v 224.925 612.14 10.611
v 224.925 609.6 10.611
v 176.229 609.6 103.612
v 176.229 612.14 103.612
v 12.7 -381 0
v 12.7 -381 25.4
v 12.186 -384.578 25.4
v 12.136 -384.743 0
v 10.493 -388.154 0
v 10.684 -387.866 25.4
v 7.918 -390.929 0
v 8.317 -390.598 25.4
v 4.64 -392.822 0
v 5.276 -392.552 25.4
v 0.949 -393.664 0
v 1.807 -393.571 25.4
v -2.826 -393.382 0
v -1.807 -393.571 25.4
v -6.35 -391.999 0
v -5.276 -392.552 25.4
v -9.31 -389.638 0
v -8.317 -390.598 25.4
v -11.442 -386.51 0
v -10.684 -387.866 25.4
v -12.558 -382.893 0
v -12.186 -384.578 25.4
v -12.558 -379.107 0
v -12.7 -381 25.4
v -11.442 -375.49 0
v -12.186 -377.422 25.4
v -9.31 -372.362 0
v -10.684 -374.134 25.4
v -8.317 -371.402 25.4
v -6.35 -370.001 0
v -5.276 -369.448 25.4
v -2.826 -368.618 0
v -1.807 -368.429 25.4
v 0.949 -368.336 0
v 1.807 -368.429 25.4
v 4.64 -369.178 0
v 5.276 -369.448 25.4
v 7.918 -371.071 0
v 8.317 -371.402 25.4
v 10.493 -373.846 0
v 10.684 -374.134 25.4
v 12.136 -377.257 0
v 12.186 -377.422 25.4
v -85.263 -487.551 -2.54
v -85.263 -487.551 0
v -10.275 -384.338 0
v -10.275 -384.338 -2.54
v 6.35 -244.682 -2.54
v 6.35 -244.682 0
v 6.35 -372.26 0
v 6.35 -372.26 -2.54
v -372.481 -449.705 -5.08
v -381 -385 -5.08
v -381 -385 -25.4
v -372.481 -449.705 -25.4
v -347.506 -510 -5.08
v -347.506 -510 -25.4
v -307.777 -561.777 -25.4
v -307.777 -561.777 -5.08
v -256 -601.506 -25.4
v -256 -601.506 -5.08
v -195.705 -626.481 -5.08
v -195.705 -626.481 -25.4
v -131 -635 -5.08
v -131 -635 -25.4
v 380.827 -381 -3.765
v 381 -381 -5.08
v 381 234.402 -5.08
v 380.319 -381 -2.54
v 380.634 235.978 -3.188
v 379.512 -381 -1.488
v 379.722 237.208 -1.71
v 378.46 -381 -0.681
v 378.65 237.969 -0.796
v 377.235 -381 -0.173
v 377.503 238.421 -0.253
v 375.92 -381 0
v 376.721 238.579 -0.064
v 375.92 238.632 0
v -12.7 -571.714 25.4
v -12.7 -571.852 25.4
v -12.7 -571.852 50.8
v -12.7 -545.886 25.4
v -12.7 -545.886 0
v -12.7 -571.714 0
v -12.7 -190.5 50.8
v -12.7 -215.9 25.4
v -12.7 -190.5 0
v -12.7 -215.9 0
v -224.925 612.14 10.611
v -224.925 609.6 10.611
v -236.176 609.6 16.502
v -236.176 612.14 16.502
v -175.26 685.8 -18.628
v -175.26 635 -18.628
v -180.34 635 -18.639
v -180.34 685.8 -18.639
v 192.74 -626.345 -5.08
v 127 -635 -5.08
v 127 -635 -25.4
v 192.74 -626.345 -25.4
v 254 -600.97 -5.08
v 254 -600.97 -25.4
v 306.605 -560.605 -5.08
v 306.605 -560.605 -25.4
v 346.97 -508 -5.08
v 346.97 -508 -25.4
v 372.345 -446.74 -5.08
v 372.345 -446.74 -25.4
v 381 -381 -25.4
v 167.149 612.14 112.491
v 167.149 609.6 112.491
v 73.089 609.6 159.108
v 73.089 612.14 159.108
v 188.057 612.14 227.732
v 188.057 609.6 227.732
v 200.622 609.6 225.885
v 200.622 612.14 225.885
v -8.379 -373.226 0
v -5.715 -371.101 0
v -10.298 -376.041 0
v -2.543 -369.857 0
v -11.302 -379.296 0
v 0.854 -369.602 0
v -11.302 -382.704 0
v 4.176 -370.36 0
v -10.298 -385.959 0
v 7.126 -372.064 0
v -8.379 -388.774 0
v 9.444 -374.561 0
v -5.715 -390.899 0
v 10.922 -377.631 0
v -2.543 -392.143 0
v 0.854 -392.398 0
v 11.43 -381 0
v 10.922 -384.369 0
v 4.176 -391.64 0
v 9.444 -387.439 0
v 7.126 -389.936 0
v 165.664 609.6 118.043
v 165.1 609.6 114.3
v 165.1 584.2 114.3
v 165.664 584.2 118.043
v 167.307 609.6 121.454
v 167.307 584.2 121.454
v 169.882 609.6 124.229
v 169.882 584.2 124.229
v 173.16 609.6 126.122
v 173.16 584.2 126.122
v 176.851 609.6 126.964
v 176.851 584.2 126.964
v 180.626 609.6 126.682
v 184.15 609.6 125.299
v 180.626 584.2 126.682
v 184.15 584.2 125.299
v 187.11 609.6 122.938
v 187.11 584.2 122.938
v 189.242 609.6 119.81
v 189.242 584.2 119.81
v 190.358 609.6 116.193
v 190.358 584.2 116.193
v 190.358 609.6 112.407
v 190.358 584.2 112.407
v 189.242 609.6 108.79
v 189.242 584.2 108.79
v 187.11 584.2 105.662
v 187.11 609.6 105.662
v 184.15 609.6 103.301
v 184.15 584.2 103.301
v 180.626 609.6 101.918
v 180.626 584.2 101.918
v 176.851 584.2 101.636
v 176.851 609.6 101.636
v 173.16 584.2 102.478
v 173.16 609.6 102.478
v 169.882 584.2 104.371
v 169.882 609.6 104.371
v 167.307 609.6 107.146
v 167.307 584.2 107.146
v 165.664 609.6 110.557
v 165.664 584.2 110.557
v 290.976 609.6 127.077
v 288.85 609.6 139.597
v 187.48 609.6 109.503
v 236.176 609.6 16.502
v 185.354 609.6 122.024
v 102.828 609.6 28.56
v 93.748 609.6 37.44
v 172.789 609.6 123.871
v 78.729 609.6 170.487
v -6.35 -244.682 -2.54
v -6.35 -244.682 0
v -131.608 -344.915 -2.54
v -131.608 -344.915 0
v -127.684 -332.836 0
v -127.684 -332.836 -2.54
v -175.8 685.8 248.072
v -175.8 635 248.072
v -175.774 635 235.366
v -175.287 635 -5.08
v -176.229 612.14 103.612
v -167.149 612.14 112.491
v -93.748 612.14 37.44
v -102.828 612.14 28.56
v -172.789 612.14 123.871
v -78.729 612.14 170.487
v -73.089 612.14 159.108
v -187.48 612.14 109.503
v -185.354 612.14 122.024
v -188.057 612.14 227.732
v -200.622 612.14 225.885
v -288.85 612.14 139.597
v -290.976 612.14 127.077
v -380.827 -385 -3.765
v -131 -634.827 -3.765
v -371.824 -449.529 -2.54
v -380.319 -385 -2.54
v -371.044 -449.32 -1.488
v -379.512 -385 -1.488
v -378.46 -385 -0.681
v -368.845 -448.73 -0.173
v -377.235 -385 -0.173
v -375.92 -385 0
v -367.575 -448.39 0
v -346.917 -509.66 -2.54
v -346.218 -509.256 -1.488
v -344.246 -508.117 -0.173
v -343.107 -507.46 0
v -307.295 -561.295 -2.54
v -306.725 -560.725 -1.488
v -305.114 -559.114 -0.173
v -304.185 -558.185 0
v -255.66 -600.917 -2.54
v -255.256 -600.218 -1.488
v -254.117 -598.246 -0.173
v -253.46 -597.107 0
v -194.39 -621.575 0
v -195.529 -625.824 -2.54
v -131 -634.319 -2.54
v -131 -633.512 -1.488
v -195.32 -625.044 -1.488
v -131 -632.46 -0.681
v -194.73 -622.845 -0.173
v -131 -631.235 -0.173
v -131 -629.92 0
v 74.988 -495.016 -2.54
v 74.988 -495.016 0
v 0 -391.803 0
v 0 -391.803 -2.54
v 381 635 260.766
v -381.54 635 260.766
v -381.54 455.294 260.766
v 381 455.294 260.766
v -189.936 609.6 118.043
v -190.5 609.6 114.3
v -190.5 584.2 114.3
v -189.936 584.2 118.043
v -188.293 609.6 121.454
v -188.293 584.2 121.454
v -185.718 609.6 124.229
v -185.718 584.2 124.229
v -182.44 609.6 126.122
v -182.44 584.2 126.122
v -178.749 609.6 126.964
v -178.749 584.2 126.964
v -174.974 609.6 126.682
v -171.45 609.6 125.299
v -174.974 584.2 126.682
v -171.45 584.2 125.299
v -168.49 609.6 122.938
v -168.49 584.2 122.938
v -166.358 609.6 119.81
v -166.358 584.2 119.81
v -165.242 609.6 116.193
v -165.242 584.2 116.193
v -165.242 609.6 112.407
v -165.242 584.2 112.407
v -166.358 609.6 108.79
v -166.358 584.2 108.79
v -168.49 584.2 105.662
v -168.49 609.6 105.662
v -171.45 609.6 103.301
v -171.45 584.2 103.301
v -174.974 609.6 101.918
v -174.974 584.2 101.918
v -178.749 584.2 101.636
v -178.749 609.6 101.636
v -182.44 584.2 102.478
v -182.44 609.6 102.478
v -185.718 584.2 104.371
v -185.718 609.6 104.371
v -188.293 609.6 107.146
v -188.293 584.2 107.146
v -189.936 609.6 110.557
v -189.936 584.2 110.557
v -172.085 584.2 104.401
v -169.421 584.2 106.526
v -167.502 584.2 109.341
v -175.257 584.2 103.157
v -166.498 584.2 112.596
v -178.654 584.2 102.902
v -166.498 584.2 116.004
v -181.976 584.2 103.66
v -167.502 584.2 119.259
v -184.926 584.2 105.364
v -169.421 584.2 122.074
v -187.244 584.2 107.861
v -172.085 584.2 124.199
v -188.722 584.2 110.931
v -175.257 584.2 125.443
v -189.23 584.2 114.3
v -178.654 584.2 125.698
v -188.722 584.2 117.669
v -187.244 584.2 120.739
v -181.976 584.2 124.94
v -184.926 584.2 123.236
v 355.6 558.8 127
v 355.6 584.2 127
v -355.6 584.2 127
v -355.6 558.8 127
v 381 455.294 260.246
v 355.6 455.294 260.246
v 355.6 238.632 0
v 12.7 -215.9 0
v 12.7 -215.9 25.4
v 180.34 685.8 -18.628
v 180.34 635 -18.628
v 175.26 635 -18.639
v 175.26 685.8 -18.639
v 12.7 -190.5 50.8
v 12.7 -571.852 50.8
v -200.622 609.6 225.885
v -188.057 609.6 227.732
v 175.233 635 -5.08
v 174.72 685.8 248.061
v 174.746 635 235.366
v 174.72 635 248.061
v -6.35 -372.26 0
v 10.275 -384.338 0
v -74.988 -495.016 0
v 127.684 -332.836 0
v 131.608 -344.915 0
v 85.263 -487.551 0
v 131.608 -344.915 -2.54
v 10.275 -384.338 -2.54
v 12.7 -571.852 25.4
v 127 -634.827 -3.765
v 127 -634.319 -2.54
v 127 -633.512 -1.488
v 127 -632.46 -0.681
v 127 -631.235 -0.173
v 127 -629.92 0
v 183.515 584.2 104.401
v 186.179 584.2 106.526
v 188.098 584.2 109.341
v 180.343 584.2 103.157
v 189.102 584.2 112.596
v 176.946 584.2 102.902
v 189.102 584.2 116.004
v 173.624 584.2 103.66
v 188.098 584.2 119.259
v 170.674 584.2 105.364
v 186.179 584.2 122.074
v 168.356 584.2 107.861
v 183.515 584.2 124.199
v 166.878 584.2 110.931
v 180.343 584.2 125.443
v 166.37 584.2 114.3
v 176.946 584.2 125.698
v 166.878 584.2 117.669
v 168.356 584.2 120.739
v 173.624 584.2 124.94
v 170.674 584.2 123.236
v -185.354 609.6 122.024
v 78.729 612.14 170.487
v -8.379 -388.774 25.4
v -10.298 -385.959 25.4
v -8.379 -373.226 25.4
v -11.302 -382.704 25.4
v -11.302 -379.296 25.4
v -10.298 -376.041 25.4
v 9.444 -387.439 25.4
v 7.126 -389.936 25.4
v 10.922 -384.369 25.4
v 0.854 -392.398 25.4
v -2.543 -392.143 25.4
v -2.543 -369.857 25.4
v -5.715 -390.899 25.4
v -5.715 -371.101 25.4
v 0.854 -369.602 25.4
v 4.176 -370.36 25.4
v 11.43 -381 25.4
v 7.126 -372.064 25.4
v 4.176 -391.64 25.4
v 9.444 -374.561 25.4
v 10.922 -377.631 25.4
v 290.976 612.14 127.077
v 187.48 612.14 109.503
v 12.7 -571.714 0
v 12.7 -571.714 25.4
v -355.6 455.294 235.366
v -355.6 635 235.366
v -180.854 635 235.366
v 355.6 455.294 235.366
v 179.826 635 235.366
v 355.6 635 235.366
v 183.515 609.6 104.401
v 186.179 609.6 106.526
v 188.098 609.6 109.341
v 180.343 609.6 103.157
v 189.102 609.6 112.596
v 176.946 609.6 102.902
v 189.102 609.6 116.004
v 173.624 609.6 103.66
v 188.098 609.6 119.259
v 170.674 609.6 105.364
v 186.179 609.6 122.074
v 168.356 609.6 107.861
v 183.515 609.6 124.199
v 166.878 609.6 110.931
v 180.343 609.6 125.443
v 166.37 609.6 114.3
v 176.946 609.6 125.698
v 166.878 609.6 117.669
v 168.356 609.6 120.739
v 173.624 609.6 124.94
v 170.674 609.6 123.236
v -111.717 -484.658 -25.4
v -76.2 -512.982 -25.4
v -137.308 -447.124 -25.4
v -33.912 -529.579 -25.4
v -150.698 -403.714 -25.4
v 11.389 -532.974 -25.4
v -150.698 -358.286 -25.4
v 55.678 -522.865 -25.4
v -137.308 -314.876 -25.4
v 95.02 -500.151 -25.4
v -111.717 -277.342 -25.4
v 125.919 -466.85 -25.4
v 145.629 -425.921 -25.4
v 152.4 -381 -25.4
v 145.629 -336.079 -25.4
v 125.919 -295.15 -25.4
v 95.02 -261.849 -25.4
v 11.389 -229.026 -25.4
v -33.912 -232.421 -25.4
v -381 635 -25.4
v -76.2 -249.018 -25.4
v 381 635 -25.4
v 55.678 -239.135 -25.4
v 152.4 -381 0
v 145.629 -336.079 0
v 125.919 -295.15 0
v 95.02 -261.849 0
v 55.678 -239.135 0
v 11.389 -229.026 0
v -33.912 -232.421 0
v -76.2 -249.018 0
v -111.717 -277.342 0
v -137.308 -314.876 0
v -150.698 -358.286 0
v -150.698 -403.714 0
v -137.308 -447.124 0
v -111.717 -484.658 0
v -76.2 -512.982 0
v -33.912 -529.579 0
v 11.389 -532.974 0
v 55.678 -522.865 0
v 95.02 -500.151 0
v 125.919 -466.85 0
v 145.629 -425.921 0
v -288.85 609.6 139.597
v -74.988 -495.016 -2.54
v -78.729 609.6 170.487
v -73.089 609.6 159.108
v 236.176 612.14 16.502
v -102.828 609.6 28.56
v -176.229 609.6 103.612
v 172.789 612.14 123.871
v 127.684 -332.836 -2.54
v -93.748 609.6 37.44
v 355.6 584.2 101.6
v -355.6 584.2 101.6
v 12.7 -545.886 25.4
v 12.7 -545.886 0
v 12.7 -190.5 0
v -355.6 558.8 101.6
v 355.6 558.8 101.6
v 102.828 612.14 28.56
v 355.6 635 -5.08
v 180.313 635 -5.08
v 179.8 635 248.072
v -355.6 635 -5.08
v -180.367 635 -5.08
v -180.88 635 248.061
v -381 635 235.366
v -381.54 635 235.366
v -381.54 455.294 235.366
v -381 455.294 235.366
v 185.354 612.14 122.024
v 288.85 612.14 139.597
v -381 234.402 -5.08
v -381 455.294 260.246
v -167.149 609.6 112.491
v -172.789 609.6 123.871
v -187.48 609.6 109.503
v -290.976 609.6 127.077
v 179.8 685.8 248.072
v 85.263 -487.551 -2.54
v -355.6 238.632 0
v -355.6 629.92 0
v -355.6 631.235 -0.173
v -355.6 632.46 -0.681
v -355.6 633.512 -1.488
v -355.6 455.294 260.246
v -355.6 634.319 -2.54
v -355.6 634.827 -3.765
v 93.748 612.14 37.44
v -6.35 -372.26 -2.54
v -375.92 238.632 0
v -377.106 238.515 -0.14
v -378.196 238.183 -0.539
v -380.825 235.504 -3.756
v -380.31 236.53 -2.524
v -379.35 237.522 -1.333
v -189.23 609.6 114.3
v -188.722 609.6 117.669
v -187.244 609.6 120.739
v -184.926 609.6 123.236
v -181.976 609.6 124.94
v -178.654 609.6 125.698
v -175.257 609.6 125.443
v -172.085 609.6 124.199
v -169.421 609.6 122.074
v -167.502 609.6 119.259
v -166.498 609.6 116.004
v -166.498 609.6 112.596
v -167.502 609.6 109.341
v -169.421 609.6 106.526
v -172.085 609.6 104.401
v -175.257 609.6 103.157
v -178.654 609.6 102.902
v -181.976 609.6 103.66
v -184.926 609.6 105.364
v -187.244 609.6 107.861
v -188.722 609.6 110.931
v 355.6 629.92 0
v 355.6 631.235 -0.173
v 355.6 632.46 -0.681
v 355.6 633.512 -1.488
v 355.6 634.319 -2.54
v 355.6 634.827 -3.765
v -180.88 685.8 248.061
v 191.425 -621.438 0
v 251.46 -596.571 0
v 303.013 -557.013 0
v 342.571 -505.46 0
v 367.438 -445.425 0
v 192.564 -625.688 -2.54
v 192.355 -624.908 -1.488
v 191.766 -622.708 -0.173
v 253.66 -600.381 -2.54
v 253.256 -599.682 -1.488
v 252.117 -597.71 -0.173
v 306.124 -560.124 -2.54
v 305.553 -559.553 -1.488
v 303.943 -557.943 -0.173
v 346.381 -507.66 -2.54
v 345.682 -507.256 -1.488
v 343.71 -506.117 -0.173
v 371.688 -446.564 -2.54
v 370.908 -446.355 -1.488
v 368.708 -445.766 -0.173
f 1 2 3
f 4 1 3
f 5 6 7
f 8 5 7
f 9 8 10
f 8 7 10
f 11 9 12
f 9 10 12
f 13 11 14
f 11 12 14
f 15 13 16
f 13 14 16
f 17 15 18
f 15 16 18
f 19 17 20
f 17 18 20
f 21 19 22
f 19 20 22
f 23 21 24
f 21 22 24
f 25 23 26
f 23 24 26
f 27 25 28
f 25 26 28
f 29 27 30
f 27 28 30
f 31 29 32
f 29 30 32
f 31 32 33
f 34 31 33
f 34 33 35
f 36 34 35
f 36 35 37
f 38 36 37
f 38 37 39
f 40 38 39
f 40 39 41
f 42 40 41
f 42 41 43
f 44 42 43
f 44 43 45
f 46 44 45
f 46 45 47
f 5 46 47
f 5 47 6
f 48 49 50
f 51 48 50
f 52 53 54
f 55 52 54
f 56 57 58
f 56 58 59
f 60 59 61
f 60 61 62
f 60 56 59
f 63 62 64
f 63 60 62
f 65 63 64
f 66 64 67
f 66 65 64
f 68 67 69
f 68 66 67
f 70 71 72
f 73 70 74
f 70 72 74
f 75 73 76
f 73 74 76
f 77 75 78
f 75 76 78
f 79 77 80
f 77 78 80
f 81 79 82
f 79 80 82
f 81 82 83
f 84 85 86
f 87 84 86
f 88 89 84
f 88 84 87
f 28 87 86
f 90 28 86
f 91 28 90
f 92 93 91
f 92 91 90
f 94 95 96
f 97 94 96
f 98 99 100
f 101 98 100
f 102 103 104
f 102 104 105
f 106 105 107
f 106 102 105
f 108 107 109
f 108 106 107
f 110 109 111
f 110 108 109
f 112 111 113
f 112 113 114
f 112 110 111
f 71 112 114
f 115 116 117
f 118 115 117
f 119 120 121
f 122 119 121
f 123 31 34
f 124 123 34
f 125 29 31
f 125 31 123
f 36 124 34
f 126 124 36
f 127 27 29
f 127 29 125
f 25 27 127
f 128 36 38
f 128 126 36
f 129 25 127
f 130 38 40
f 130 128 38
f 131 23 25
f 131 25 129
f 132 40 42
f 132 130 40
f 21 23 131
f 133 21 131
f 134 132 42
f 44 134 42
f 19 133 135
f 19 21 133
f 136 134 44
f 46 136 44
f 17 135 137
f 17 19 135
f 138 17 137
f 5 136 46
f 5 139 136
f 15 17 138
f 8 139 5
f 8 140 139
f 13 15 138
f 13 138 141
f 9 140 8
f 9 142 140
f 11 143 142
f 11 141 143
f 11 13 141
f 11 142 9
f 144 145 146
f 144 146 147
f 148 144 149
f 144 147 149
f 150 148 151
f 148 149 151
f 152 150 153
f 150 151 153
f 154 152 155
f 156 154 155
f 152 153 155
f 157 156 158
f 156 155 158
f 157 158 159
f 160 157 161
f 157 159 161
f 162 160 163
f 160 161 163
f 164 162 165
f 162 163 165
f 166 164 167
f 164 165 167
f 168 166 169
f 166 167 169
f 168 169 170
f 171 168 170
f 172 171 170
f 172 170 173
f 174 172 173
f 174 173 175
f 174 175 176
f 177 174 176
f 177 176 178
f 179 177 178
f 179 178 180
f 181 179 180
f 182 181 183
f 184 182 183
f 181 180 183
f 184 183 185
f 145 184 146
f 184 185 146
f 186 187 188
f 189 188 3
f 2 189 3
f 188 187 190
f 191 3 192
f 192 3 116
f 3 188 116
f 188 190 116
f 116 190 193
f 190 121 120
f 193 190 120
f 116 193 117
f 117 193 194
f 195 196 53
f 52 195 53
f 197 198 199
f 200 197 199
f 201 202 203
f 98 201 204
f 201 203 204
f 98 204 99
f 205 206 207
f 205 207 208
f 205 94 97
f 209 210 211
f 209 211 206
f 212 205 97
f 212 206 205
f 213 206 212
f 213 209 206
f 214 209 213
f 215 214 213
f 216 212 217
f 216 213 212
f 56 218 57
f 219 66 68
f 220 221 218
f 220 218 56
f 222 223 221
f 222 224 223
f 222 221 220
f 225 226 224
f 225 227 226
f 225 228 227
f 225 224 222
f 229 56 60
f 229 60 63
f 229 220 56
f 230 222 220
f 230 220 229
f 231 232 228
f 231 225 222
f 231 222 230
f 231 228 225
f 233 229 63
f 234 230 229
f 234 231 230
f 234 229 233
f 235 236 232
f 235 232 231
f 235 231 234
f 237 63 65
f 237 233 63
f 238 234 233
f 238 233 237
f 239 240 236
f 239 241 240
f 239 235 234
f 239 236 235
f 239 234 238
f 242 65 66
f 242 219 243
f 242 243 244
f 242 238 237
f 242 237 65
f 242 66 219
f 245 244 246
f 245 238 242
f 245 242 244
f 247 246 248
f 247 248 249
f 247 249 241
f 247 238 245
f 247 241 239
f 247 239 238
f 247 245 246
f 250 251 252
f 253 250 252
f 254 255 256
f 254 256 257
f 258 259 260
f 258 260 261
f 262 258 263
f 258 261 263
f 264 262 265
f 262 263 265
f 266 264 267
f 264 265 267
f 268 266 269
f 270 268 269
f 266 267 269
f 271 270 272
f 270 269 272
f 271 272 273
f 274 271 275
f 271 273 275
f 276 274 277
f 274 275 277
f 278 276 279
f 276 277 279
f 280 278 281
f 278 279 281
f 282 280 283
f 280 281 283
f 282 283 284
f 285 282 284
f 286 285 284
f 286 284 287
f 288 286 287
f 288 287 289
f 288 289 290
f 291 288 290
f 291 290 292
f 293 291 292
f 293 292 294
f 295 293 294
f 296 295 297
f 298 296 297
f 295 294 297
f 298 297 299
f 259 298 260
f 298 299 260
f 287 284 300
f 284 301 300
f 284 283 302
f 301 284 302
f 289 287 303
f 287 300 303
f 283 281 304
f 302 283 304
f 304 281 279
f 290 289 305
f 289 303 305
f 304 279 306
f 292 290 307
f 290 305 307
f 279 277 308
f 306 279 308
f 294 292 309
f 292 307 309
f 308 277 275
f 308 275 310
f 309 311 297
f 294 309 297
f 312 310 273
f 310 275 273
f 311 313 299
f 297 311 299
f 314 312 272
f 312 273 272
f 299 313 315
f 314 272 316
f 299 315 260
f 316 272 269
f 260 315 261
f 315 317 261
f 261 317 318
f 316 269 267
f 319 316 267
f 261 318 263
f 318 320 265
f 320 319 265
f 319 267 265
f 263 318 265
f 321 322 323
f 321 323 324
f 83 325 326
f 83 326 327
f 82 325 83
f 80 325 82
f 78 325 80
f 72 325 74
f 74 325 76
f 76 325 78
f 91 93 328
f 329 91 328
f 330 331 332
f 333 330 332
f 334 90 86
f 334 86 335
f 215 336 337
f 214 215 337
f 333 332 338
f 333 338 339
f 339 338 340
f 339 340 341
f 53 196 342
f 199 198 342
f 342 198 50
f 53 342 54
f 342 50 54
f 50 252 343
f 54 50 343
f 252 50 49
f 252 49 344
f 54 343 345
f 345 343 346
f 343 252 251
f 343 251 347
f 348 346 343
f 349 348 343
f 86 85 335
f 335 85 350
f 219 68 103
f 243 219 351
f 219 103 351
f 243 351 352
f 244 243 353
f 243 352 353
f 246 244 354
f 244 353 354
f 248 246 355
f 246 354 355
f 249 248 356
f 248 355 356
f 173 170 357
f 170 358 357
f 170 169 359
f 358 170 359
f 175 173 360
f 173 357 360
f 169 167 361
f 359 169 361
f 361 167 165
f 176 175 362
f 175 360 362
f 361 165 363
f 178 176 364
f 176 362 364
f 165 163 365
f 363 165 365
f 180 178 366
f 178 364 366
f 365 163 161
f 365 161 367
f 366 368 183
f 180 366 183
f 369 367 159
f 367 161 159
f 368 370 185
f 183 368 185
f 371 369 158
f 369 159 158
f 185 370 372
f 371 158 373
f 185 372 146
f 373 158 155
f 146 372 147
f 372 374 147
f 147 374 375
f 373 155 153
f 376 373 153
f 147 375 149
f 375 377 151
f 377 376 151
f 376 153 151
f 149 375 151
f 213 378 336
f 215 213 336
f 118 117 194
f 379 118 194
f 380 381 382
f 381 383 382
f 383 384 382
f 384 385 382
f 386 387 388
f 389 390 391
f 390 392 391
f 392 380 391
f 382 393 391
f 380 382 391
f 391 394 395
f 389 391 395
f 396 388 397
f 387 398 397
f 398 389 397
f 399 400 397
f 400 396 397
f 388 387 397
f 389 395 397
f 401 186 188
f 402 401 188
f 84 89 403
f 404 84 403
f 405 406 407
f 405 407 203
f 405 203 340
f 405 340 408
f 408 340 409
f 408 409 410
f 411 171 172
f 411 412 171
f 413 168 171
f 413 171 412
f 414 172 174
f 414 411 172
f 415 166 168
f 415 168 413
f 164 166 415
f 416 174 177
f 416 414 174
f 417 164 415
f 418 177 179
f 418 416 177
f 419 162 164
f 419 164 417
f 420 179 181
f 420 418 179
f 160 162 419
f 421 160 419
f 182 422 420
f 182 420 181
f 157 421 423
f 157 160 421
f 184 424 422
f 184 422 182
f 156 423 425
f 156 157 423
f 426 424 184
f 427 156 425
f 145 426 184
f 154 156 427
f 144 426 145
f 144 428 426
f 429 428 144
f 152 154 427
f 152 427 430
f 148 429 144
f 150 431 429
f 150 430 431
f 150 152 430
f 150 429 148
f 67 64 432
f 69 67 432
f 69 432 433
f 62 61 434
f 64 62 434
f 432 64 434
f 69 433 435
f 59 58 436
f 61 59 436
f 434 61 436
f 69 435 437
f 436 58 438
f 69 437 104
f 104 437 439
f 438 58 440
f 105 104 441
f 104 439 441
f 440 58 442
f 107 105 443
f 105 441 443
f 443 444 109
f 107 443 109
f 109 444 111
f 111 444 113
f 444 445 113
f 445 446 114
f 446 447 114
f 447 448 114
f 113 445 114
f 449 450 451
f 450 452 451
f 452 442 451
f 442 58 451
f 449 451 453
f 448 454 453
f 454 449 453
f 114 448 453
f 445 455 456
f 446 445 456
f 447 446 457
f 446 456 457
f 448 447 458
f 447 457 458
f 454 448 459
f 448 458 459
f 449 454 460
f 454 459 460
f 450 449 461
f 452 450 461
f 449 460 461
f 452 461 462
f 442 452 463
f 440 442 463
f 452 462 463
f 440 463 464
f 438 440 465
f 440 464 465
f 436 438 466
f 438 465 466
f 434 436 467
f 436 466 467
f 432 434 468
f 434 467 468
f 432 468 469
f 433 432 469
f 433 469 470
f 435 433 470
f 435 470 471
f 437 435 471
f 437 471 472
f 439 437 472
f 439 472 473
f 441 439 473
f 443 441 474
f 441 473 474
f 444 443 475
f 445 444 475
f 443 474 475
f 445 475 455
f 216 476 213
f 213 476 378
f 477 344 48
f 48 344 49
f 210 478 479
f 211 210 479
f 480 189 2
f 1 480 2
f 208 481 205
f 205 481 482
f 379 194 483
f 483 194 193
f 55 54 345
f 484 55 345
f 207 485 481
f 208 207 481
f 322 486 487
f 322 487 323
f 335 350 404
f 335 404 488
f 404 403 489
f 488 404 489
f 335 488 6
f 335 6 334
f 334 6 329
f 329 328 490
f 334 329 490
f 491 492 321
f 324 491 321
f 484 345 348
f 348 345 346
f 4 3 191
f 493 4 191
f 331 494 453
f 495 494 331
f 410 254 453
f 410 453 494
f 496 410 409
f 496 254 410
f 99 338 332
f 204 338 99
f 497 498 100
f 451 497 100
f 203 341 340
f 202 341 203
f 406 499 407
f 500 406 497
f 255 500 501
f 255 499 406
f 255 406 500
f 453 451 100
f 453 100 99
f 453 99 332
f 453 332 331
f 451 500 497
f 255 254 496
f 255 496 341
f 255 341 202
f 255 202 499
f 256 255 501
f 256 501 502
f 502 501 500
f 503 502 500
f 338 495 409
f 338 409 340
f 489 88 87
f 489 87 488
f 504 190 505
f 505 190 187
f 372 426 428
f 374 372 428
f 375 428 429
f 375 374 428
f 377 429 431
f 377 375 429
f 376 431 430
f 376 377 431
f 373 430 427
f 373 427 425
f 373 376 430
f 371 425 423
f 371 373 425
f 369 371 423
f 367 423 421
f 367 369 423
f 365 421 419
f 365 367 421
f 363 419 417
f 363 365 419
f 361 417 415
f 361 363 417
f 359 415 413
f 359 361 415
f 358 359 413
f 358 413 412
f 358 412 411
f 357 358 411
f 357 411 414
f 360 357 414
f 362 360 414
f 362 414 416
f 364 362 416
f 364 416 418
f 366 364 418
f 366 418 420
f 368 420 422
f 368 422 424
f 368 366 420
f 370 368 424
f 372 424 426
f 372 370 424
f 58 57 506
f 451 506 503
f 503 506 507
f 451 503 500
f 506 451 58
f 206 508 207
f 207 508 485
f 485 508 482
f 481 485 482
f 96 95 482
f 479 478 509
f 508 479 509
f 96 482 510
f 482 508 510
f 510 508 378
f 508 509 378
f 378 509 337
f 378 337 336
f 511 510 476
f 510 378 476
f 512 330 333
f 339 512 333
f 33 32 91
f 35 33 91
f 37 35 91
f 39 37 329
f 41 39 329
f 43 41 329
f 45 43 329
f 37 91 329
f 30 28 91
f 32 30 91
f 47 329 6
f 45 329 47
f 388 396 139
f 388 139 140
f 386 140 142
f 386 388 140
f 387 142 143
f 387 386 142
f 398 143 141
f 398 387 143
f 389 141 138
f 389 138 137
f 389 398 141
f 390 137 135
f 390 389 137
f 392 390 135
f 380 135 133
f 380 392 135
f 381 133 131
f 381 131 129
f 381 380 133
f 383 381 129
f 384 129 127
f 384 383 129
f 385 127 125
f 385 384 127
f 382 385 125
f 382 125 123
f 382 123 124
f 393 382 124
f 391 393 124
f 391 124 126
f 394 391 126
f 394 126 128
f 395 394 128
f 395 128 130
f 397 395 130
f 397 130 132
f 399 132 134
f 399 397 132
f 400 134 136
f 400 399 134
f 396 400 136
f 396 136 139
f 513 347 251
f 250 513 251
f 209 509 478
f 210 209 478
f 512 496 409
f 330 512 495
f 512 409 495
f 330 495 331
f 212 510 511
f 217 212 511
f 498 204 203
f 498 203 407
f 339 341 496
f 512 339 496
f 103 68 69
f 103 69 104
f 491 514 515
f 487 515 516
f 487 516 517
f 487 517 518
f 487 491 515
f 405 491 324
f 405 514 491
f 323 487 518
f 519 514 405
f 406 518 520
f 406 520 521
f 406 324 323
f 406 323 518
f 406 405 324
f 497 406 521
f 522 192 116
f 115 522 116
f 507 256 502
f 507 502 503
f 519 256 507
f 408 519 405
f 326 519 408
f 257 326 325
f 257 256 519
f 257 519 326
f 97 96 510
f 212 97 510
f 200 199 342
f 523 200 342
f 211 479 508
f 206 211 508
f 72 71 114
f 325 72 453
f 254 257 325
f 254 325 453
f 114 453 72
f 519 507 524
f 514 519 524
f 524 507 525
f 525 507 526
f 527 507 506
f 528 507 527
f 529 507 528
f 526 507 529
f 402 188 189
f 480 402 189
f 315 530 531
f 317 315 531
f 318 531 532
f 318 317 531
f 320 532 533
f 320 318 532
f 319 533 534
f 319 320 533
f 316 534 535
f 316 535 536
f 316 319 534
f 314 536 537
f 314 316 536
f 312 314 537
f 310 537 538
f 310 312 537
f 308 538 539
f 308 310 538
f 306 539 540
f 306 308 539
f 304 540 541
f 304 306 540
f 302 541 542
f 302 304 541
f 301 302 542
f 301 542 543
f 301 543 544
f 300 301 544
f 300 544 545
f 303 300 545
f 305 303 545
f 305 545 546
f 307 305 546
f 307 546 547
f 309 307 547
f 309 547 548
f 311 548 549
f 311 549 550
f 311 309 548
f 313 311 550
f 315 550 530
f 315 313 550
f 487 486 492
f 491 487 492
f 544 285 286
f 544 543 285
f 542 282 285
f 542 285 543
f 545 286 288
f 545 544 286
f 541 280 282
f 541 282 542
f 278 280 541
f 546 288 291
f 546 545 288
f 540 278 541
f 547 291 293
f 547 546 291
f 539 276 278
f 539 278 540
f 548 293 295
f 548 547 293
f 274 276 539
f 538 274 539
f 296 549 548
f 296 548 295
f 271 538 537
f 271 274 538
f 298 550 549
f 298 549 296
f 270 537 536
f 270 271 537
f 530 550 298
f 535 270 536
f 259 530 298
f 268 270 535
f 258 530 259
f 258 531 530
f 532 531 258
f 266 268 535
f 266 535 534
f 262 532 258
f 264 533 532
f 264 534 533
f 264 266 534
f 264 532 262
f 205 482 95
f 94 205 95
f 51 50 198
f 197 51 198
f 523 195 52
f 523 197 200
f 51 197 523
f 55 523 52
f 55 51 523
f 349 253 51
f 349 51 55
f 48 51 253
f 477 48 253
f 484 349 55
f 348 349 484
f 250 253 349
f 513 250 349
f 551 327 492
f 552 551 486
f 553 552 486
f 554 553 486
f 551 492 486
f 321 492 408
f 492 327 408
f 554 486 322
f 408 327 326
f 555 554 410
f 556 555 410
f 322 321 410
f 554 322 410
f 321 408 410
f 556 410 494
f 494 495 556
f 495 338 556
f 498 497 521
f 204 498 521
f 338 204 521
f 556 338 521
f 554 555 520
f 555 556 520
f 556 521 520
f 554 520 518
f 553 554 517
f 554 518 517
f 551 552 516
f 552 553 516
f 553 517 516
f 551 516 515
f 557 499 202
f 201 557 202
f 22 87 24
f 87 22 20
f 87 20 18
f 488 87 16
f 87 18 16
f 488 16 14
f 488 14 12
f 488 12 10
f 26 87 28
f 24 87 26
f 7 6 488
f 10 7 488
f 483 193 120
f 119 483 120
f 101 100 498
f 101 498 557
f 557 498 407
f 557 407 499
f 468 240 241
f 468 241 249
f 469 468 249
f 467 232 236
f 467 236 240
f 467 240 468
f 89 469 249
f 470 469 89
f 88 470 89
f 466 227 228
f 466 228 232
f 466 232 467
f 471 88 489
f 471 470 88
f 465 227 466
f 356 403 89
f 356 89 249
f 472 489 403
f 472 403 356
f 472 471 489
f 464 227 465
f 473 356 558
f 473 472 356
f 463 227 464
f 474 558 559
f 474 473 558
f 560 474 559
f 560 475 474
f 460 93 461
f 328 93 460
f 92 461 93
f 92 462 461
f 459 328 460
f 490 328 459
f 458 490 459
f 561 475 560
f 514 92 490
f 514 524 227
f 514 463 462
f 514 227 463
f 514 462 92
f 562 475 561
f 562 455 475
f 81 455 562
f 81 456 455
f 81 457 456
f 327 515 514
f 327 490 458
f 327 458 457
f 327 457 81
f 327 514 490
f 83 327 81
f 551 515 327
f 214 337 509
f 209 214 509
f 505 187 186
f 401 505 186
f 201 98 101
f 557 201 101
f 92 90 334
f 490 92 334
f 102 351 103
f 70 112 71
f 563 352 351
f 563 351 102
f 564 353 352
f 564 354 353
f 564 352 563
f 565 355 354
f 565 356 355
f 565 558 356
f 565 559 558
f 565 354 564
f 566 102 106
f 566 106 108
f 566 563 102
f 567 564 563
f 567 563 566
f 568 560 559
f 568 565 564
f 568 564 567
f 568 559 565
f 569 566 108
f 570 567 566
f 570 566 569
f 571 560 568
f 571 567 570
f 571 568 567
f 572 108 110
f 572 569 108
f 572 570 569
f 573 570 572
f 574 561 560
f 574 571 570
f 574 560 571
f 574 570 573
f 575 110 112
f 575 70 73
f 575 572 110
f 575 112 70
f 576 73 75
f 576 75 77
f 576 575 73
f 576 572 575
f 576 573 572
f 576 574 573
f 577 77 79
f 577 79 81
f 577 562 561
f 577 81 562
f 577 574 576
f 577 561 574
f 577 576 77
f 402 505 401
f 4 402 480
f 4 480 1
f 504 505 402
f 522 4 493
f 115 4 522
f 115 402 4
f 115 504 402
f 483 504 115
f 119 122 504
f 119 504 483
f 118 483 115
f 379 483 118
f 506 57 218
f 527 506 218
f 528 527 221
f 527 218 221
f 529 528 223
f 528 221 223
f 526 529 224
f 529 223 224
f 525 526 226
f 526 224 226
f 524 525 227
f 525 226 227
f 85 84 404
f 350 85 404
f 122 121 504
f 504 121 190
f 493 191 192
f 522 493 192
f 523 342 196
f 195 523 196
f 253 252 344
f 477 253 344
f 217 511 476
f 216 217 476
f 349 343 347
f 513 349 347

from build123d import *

# Parameters (mm, degrees)
F0_R      = 152.4
F1_DEPTH  = 25.4
F2_R      = 5.08
F3_W      = 25.4
F3_H      = 25.4
F3_H_2    = 25.8285974579
F4_DEPTH  = 25.4
F5_W      = 25.4
F5_H      = 381.3520879745
F6_DEPTH  = 25.4
F8_DEPTH  = 25.4
F11_DEPTH = 25.4
F12_W     = 25.4
F12_H     = 25.4
F13_DEPTH = 711.2
F14_R     = 12.7
F14_R_2   = 11.43
F15_DEPTH = 25.4
F17_DEPTH = 2.54
F19_DEPTH = 50.8
F20_R     = 12.7
F20_R_2   = 11.43
F21_DEPTH = 25.4
F23_DEPTH = 2.54


# Not quite as in the source:
# - the program builds the solid bodies; features that only make, move or delete a surface that nothing else refers to are left out


with BuildPart() as f1:
    # F0 (on Top) → F1 (new body)
    with BuildSketch(Plane.XY):
        with BuildLine():
            Line((381, 635), (-381, 635))
            Line((-381, 635), (-381, -385))
            ThreePointArc((-381, -385), (-307.7766952966, -561.7766952966), (-131, -635))
            Line((-131, -635), (127, -635))
            ThreePointArc((127, -635), (306.6051224214, -560.6051224214), (381, -381))
            Line((381, -381), (381, 635))
        make_face()
        with Locations((0, -381)):
            Circle(F0_R, mode=Mode.SUBTRACT)
    extrude(amount=-F1_DEPTH)

    # F2
    f2_edges = [f1.edges().sort_by_distance(p)[0] for p in [
        (-381, 125, 0),
        (-307.776695, -561.776695, 0),
        (-2, -635, 0),
        (306.605122, -560.605122, 0),
        (381, 127, 0),
        (0, 635, 0),
    ]]
    fillet(f2_edges, radius=F2_R)

    # F3 (on face) → F4 (join)
    with BuildSketch(Plane.XY):
        with Locations((0, -203.2)):
            Rectangle(F3_W, F3_H)
        with Locations((0, -558.8)):
            Rectangle(F3_W, F3_H_2)
    extrude(amount=F4_DEPTH)

    # F5 (on face) → F6 (join)
    with BuildSketch(Plane.XY.offset(25.4)):
        with Locations((0, -381.1760439873)):
            Rectangle(F5_W, F5_H)
    extrude(amount=F6_DEPTH)

    # F9: F8 across plane


with BuildPart() as f8:
    # F7 (on face) → F8 (new body)
    with BuildSketch(Plane.YZ.offset(381)):
        Polygon((234.4024777412, -5.08), (635, -5.08), (635, 260.7663869858), (455.7277560234, 260.7663869858), align=None)
    extrude(amount=-F8_DEPTH)


with BuildPart() as f1_1:
    add(f1.part)
    add(f8.part.mirror(Plane.YZ))


    add(f8.part)  # F11 merges F8
    # F10 (on face) → F11 (join)
    with BuildSketch(Plane.XY.offset(260.7663869858)):
        Polygon((355.6, 455.7277560234), (355.6, 635), (-381.5401494503, 635), (-381.5401494503, 455.294251442), (381, 455.294251442), (381, 455.7277560234), align=None)
    extrude(amount=-F11_DEPTH)

    # F12 (on face) → F13 (join, through all)
    with BuildSketch(Plane(origin=(355.6, 0, 0), x_dir=(0, -1, 0), z_dir=(-1, 0, 0))):
        with Locations((-571.5, 114.3)):
            Rectangle(F12_W, F12_H)
    extrude(amount=F13_DEPTH)

    # F18 (on face) → F19 (join)
    with BuildSketch(Plane(origin=(0, 635, 0), x_dir=(-1, 0, 0), z_dir=(0, 1, 0))):
        Polygon((-180.3399947906, -18.6284687443), (-175.2600052094, -18.6387572841), (-174.7198557591, 248.0612427159), (-179.7998453403, 248.0715312557), align=None)
        Polygon((180.8801442409, 248.0612427159), (175.8001546597, 248.0715312557), (175.2600052094, -18.6284687443), (180.3399947906, -18.6387572841), align=None)
    extrude(amount=F19_DEPTH)

    # F20 (on face) → F21 (join)
    with BuildSketch(Plane(origin=(0, 0, 25.4), x_dir=(1, 0, 0), z_dir=(0, 0, -1))):
        with Locations((0, 381)):
            Circle(F20_R)
        with Locations((0, 381)):
            Circle(F20_R_2, mode=Mode.SUBTRACT)
    extrude(amount=F21_DEPTH)


with BuildPart() as f15:
    # F14 (on face) → F15 (new body)
    with BuildSketch(Plane(origin=(0, 584.2, 0), x_dir=(-1, 0, 0), z_dir=(0, 1, 0))):
        with Locations((-177.8, 114.3)):
            Circle(F14_R)
        with Locations((-177.8, 114.3)):
            Circle(F14_R_2, mode=Mode.SUBTRACT)
    extrude(amount=F15_DEPTH)


with BuildPart() as f15b:
    # F14 (on face) → F15, piece 2 (new body)
    with BuildSketch(Plane(origin=(0, 584.2, 0), x_dir=(-1, 0, 0), z_dir=(0, 1, 0))):
        with Locations((177.8, 114.3)):
            Circle(F14_R)
        with Locations((177.8, 114.3)):
            Circle(F14_R_2, mode=Mode.SUBTRACT)
    extrude(amount=F15_DEPTH)


with BuildPart() as f17:
    # F16 (on face) → F17 (new body)
    with BuildSketch(Plane(origin=(0, 609.6, 0), x_dir=(-1, 0, 0), z_dir=(0, 1, 0))):
        Polygon((-176.2287217864, 103.6116089142), (-173.1315717637, 109.5266083861), (-167.1491895745, 112.4914773008), (-171.8176097634, 117.2648706101), (-172.7887111674, 123.8706576668), (-178.771098065, 120.9057864186), (-185.3536605461, 122.0235143615), (-184.382560212, 115.4177345825), (-187.4797086447, 109.5027381472), (-180.8971505009, 108.3850109408), align=None)
        Polygon((-167.1491895745, 112.4914773008), (-173.1315717637, 109.5266083861), (-176.2287217864, 103.6116089142), (-102.8278704973, 28.560281428), (-93.7483348442, 37.4401462961), align=None)
        Polygon((-171.8176097634, 117.2648706101), (-167.1491895745, 112.4914773008), (-73.089019826, 159.1077021724), (-78.7285420374, 170.4868822318), (-172.7887111674, 123.8706576668), align=None)
        Polygon((-224.9246668441, 10.6111125903), (-176.2287217864, 103.6116089142), (-180.8971505009, 108.3850109408), (-187.4797086447, 109.5027381472), (-236.1756559324, 16.5022375643), align=None)
        Polygon((-178.771098065, 120.9057864186), (-172.7887111674, 123.8706576668), (-188.0571847598, 227.7324014723), (-200.6221340373, 225.8852574787), (-185.3536605461, 122.0235143615), align=None)
        Polygon((-290.976313686, 127.0766005719), (-187.4797086447, 109.5027381472), (-184.382560212, 115.4177345825), (-185.3536605461, 122.0235143615), (-288.8502689845, 139.597377363), align=None)
    extrude(amount=F17_DEPTH)


with BuildPart() as f17b:
    # F16 (on face) → F17, piece 2 (new body)
    with BuildSketch(Plane(origin=(0, 609.6, 0), x_dir=(-1, 0, 0), z_dir=(0, 1, 0))):
        Polygon((172.7887111674, 123.8706576668), (178.771098065, 120.9057864186), (185.3536605461, 122.0235143615), (200.6221340373, 225.8852574787), (188.0571847598, 227.7324014723), align=None)
        Polygon((185.3536605461, 122.0235143615), (178.771098065, 120.9057864186), (172.7887111674, 123.8706576668), (171.8176097634, 117.2648706101), (167.1491895745, 112.4914773008), (173.1315717637, 109.5266083861), (176.2287217864, 103.6116089142), (180.8971505009, 108.3850109408), (187.4797086447, 109.5027381472), (184.382560212, 115.4177345825), align=None)
        Polygon((288.8502689845, 139.597377363), (185.3536605461, 122.0235143615), (184.382560212, 115.4177345825), (187.4797086447, 109.5027381472), (290.976313686, 127.0766005719), align=None)
        Polygon((171.8176097634, 117.2648706101), (172.7887111674, 123.8706576668), (78.7285420374, 170.4868822318), (73.089019826, 159.1077021724), (167.1491895745, 112.4914773008), align=None)
        Polygon((236.1756559324, 16.5022375643), (187.4797086447, 109.5027381472), (180.8971505009, 108.3850109408), (176.2287217864, 103.6116089142), (224.9246668441, 10.6111125903), align=None)
        Polygon((173.1315717637, 109.5266083861), (167.1491895745, 112.4914773008), (93.7483348442, 37.4401462961), (102.8278704973, 28.560281428), (176.2287217864, 103.6116089142), align=None)
    extrude(amount=F17_DEPTH)


with BuildPart() as f23:
    # F22 (on face) → F23 (new body)
    with BuildSketch(Plane(origin=(0, 0, 0), x_dir=(1, 0, 0), z_dir=(0, 0, -1))):
        Polygon((6.3499999233, 372.2599748299), (2.16544e-05, 374.3232078401), (-6.35, 372.2599607331), (-6.35, 244.6820527577), (6.3499999233, 244.6820527577), align=None)
        Polygon((-6.35, 372.2599607331), (2.16544e-05, 374.3232078401), (6.3499999233, 372.2599748299), (6.3499999233, 378.9367598233), (10.2745163884, 384.3383933324), (3.9245149228, 386.4016338797), (5.85e-08, 391.8032651855), (-3.9245156754, 386.4016326828), (-10.2745080358, 384.338395094), (-6.35, 378.9367731868), align=None)
        Polygon((-127.6838099629, 332.8362160572), (-6.35, 372.2599607331), (-6.35, 378.9367731868), (-10.2745080358, 384.338395094), (-131.6083299271, 344.9146465423), align=None)
        Polygon((6.3499999233, 378.9367598233), (6.3499999233, 372.2599748299), (127.6838140985, 332.8362287853), (131.608330207, 344.9146474037), (10.2745163884, 384.3383933324), align=None)
        Polygon((-85.2629306216, 487.5511041858), (-10.2745080358, 384.338395094), (-3.9245156754, 386.4016326828), (5.85e-08, 391.8032651855), (-74.9884210975, 495.0159723094), align=None)
        Polygon((3.9245149228, 386.4016338797), (10.2745163884, 384.3383933324), (85.2629369261, 487.5510996053), (74.9884211741, 495.0159722538), (5.85e-08, 391.8032651855), align=None)
    extrude(amount=F23_DEPTH)


solid = Compound([f1_1.part, f15.part, f15b.part, f17.part, f17b.part, f23.part])
